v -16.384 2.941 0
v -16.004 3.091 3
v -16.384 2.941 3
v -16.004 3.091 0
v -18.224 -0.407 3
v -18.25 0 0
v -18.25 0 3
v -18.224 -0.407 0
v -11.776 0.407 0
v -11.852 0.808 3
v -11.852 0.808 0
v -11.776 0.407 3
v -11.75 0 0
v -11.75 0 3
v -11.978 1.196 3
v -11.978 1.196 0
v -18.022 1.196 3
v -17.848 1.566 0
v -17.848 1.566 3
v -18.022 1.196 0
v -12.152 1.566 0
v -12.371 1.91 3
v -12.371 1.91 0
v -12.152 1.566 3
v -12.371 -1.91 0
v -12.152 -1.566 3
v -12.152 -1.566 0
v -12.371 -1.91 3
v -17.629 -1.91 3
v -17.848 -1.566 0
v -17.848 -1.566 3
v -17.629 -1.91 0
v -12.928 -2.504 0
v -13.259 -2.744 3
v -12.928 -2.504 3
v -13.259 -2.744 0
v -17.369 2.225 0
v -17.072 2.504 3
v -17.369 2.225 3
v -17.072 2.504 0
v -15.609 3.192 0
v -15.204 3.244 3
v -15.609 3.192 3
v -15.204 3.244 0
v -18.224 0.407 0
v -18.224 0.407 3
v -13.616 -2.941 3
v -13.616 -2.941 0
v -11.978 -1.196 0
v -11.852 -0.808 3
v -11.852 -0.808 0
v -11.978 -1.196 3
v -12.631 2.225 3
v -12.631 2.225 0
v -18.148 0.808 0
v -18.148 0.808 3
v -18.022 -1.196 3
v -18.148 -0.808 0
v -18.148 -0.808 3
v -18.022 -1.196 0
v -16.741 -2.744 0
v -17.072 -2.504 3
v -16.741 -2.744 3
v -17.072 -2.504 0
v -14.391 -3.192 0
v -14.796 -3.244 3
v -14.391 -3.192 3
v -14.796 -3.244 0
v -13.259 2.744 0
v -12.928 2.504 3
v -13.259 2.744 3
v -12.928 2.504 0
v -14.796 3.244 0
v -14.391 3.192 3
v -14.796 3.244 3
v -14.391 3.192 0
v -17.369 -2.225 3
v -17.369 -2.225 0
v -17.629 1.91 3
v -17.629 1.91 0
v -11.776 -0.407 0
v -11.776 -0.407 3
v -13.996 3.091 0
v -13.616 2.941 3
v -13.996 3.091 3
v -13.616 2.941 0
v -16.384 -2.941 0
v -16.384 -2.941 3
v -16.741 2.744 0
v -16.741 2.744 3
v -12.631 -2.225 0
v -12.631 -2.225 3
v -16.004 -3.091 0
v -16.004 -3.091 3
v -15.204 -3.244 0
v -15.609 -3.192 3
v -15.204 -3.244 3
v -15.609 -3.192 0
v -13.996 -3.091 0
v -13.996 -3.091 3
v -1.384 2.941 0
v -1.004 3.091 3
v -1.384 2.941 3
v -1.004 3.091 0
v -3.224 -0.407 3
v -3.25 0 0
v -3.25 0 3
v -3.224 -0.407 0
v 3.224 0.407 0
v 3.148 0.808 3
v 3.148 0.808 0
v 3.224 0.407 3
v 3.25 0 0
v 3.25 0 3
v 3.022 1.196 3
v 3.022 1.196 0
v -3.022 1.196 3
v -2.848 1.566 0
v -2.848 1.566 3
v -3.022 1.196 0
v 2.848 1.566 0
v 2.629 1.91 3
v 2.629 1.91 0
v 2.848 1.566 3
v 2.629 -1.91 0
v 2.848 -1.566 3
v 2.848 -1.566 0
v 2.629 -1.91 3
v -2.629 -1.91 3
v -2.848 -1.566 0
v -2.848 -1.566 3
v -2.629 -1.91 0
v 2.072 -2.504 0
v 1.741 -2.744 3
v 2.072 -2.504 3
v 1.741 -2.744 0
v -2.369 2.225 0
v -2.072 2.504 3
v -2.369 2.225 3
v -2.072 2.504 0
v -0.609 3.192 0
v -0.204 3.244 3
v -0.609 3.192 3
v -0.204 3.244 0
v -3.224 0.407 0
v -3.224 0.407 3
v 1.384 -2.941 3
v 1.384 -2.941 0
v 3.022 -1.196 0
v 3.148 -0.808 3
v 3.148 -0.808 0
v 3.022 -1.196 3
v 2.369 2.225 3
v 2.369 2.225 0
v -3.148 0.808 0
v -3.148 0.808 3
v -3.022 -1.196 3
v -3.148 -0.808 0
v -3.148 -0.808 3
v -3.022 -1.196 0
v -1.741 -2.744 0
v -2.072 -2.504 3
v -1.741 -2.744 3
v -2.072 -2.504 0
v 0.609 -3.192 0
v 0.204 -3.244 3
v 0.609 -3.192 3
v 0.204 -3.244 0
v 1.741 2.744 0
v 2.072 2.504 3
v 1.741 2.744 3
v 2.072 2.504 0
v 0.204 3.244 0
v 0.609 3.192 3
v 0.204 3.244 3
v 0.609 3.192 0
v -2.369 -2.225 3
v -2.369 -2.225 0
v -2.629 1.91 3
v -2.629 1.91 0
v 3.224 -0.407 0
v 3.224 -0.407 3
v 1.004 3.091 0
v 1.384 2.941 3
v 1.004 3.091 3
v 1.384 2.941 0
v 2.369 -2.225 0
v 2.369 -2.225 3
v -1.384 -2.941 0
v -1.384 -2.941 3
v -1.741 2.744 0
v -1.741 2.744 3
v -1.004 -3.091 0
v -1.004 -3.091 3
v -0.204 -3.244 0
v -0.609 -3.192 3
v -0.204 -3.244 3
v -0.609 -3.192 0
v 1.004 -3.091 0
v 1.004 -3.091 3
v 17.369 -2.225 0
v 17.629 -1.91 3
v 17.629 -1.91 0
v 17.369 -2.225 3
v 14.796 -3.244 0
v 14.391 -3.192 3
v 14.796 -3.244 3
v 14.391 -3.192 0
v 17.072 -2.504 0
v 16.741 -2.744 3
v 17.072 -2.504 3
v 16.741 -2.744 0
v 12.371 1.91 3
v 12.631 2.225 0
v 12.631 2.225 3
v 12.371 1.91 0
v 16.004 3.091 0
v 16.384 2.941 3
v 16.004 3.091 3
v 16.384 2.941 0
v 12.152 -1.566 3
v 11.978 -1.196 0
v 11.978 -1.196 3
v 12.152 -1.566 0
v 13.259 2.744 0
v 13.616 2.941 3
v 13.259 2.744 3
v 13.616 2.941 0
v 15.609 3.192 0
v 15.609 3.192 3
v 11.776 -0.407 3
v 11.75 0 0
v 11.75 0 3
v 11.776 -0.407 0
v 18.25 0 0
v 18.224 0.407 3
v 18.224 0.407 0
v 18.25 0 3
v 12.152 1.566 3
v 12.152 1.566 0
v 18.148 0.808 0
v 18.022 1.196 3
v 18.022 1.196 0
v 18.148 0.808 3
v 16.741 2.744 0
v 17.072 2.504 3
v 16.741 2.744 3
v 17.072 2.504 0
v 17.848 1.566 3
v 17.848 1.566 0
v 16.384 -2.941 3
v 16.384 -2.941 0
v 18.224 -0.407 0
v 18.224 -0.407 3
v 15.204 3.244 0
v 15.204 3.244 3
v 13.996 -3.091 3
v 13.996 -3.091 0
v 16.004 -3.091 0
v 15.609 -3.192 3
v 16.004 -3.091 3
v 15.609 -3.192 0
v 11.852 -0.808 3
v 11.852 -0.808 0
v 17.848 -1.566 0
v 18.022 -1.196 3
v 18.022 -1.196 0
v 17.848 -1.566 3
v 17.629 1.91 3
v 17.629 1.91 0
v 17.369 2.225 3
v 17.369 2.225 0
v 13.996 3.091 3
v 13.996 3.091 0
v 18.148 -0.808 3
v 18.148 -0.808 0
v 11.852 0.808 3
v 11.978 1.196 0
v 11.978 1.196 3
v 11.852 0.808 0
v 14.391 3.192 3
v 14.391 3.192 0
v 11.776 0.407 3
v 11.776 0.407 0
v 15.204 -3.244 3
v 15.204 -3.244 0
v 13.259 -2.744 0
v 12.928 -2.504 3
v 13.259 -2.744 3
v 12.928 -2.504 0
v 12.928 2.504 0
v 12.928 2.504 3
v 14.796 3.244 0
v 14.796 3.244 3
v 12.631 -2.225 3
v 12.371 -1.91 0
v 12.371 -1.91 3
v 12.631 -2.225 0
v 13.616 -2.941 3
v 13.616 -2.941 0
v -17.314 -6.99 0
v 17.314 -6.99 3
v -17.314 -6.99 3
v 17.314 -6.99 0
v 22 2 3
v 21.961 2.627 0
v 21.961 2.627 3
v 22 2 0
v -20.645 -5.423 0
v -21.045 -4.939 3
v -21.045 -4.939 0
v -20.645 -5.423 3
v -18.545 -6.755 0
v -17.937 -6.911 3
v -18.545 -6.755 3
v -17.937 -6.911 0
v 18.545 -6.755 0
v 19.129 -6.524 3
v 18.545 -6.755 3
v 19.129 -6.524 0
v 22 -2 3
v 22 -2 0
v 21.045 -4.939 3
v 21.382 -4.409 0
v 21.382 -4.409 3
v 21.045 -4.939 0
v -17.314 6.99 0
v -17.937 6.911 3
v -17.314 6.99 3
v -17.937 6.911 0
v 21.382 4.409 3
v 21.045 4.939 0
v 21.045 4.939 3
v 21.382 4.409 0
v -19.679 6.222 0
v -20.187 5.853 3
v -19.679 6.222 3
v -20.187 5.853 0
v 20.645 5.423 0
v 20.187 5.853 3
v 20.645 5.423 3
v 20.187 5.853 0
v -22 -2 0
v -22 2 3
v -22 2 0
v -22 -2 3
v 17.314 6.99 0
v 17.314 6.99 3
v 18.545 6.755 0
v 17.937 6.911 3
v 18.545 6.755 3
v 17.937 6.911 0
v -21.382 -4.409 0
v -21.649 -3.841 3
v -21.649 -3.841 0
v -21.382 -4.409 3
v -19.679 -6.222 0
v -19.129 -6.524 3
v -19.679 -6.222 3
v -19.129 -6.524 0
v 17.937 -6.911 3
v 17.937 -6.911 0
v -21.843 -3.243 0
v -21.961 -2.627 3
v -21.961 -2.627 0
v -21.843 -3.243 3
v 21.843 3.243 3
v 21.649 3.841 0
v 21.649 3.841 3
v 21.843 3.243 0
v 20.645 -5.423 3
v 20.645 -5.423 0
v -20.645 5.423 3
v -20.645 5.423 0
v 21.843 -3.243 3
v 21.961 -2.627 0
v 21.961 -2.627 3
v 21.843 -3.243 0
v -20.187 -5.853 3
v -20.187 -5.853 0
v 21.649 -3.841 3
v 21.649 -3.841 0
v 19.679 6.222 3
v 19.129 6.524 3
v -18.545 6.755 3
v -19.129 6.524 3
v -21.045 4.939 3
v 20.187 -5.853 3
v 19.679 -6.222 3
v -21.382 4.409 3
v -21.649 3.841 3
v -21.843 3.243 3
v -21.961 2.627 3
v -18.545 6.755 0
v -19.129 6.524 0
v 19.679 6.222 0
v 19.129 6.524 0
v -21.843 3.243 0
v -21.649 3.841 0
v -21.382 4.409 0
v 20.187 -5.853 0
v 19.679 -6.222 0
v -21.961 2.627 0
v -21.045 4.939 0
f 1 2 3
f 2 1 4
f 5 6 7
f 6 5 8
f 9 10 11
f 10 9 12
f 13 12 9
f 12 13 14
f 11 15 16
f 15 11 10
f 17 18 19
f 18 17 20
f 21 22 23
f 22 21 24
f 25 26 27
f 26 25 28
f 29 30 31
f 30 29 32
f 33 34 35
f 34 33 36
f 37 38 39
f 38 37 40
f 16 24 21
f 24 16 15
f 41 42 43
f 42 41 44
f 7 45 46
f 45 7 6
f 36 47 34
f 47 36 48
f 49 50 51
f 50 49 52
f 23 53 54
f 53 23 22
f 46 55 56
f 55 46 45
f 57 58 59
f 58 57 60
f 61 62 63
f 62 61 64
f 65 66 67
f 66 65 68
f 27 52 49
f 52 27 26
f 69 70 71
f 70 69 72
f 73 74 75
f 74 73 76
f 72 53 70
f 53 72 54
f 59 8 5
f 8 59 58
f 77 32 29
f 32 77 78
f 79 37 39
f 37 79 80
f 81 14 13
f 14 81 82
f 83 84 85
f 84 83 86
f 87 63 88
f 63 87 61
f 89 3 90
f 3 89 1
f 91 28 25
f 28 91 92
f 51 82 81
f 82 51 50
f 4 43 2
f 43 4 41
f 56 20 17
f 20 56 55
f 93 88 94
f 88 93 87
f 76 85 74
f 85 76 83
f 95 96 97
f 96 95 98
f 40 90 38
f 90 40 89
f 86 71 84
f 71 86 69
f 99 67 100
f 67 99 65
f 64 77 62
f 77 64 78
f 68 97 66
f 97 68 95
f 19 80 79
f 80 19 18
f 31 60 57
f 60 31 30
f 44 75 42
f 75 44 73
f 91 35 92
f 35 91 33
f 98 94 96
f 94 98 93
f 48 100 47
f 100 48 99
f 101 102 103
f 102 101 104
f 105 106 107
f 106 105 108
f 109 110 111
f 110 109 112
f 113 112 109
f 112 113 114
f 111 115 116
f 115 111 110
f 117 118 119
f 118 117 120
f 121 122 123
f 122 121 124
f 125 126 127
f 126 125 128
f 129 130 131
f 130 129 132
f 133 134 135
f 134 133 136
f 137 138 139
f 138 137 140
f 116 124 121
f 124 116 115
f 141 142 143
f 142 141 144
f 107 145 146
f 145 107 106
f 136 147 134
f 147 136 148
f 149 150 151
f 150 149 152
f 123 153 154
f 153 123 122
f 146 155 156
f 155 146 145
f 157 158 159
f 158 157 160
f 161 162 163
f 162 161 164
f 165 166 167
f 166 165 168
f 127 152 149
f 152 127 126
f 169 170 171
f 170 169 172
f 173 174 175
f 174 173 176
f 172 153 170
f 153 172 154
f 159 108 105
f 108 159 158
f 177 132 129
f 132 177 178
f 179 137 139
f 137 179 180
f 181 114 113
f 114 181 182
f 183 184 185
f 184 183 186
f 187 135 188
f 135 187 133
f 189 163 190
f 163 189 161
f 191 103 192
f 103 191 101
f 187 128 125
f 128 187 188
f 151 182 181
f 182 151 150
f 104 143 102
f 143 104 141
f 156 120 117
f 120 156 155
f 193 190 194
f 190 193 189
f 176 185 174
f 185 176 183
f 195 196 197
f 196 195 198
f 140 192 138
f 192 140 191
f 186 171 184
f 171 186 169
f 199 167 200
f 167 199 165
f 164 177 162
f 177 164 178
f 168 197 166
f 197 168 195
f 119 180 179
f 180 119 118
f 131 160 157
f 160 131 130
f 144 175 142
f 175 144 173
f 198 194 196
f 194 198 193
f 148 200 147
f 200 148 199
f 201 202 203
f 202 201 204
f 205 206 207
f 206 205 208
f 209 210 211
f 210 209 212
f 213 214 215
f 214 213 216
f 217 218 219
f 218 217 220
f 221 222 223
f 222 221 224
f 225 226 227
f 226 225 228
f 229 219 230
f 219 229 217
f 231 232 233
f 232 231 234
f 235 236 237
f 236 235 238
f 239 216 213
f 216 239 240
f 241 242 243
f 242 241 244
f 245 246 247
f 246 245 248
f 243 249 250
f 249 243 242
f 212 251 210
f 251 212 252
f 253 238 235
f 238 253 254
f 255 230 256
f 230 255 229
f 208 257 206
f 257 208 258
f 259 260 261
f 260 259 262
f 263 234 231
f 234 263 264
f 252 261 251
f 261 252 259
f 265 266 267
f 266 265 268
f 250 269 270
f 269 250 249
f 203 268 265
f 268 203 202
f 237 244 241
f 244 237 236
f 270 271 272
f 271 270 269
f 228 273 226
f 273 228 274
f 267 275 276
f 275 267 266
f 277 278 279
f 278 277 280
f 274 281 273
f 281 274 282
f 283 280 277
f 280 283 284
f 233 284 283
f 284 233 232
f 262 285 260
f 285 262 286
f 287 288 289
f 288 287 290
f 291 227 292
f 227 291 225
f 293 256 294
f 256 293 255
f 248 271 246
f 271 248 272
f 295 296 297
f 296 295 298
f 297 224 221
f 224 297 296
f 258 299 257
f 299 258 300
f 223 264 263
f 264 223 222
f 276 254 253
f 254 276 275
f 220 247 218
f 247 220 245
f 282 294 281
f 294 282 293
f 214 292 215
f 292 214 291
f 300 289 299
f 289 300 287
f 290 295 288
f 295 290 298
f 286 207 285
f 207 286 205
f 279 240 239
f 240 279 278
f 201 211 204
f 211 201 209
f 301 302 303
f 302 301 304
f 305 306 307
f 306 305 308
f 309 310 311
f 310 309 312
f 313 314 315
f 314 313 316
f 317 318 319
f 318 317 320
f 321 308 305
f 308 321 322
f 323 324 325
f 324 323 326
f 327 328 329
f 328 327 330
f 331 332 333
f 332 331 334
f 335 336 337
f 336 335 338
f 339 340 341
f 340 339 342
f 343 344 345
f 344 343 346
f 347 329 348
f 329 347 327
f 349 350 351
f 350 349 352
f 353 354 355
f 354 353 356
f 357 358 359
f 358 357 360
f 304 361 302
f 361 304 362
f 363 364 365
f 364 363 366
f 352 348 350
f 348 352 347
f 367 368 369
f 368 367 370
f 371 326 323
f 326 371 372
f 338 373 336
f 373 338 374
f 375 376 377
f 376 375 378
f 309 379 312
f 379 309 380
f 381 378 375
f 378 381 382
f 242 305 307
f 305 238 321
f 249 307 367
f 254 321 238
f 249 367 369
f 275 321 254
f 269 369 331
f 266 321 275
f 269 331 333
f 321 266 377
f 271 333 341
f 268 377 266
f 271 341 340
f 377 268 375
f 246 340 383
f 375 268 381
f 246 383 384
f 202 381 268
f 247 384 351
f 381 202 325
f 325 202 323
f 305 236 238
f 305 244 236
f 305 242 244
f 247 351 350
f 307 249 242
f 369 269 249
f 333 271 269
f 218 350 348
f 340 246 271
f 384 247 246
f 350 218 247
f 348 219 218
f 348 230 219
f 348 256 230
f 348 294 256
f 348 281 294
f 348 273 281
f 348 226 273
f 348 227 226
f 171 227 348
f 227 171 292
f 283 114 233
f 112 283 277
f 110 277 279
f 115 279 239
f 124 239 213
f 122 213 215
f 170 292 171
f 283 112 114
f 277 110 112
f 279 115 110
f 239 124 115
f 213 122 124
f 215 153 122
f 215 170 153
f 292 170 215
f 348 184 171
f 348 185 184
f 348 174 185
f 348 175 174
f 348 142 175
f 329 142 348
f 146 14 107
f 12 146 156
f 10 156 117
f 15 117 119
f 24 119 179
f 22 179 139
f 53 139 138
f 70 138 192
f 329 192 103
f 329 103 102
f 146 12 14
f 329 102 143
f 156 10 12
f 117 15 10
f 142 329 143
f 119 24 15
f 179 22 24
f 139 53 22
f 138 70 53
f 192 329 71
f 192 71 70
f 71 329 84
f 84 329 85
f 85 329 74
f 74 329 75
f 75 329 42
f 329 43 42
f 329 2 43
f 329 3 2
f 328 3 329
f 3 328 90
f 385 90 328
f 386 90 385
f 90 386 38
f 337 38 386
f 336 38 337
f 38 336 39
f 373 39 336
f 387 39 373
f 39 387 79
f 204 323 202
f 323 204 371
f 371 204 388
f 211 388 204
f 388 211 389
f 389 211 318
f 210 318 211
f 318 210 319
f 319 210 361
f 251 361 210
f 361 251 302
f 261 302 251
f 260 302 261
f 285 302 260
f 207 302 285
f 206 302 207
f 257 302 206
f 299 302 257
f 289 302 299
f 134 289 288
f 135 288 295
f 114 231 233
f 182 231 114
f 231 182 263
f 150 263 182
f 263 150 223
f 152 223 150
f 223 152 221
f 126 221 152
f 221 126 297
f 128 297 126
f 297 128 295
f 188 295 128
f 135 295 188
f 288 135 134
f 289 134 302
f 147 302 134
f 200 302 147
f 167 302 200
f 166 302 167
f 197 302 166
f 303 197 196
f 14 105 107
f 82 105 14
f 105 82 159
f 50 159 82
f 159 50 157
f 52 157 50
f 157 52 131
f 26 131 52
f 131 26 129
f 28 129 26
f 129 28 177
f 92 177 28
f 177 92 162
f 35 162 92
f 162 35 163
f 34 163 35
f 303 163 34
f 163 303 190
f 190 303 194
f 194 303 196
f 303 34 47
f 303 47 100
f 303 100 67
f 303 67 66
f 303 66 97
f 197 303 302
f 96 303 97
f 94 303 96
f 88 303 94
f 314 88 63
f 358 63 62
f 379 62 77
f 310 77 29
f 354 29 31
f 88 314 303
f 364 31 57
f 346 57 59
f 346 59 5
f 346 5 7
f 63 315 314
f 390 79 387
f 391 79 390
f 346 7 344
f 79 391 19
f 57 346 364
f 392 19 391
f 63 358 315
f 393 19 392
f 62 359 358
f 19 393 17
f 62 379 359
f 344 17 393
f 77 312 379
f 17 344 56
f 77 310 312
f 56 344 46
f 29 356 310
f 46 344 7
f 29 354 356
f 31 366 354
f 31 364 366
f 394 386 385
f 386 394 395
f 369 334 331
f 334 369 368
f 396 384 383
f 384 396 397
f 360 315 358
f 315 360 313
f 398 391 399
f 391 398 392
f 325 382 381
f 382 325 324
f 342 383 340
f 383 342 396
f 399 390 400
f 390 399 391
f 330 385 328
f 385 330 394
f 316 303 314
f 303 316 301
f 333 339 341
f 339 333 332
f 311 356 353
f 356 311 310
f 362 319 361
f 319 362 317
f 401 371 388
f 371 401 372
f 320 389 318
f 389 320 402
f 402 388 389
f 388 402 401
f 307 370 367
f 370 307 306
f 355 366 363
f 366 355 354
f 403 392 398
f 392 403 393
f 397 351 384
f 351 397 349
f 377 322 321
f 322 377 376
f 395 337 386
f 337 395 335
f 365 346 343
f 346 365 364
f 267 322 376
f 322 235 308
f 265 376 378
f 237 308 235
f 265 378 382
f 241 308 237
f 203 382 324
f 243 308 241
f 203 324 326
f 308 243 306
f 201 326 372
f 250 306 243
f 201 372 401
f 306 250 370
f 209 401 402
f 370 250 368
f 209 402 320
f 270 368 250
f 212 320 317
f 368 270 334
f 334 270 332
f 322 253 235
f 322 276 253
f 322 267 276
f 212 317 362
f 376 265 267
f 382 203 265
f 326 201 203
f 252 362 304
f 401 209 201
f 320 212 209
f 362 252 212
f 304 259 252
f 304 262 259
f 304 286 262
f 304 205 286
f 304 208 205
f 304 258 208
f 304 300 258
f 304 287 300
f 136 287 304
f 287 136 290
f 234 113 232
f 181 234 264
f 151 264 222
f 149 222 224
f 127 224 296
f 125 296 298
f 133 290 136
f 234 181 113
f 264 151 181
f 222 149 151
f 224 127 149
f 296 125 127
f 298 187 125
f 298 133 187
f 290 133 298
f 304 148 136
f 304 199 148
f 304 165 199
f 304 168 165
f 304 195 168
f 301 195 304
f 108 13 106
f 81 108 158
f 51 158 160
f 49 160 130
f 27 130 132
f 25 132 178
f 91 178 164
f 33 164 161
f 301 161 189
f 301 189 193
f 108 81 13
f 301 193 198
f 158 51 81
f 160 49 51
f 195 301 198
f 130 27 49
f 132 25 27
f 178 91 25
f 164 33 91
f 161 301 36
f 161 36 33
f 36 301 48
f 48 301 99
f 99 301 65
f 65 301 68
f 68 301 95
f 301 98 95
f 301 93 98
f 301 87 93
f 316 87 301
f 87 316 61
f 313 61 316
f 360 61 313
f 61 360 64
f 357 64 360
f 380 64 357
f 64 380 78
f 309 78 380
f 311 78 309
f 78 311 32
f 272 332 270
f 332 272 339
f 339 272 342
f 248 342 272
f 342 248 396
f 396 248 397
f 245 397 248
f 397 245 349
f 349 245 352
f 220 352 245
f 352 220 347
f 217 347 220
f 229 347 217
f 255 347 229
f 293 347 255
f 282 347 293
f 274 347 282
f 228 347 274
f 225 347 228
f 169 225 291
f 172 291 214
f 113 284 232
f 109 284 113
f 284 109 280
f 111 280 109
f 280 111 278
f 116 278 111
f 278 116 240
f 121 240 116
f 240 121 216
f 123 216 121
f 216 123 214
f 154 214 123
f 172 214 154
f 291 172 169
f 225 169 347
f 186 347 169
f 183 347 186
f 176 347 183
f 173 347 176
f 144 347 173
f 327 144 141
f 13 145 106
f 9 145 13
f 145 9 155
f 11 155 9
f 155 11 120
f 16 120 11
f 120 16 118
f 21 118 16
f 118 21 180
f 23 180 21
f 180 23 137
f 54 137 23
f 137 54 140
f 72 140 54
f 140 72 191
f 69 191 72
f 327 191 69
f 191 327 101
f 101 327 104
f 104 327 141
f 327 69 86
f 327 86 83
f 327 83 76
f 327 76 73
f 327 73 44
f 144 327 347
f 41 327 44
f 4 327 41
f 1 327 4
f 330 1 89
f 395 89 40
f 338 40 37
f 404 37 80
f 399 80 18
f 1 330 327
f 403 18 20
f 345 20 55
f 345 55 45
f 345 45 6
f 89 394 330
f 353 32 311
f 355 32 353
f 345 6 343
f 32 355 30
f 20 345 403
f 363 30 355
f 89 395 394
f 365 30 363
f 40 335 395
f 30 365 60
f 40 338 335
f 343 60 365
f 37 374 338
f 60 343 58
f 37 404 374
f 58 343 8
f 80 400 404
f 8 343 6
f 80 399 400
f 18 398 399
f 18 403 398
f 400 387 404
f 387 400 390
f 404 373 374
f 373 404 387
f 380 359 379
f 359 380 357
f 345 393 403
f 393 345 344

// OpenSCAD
// Generated by SolidPython 1.1.3 on 2023-03-13 21:42:52
$fn = 50;


difference() {
	union() {
		translate(v = [0, 0, 0]) {
			rotate(a = [0, 0, 0]) {
				hull() {
					translate(v = [-17.0000000000, 2.0000000000, 0]) {
						rotate(a = [0, 0, 0]) {
							translate(v = [0, 0, 0]) {
								rotate(a = [0, 0, 0]) {
									cylinder(h = 3, r = 5);
								}
							}
						}
					}
					translate(v = [17.0000000000, 2.0000000000, 0]) {
						rotate(a = [0, 0, 0]) {
							translate(v = [0, 0, 0]) {
								rotate(a = [0, 0, 0]) {
									cylinder(h = 3, r = 5);
								}
							}
						}
					}
					translate(v = [-17.0000000000, -2.0000000000, 0]) {
						rotate(a = [0, 0, 0]) {
							translate(v = [0, 0, 0]) {
								rotate(a = [0, 0, 0]) {
									cylinder(h = 3, r = 5);
								}
							}
						}
					}
					translate(v = [17.0000000000, -2.0000000000, 0]) {
						rotate(a = [0, 0, 0]) {
							translate(v = [0, 0, 0]) {
								rotate(a = [0, 0, 0]) {
									cylinder(h = 3, r = 5);
								}
							}
						}
					}
				}
			}
		}
	}
	union() {
		translate(v = [-15.0000000000, 0.0000000000, 0]) {
			rotate(a = [0, 0, 0]) {
				translate(v = [0, 0, -50]) {
					rotate(a = [0, 0, 0]) {
						cylinder(h = 100, r = 3.2500000000);
					}
				}
			}
		}
		translate(v = [0.0000000000, 0.0000000000, 0]) {
			rotate(a = [0, 0, 0]) {
				translate(v = [0, 0, -50]) {
					rotate(a = [0, 0, 0]) {
						cylinder(h = 100, r = 3.2500000000);
					}
				}
			}
		}
		translate(v = [15.0000000000, 0.0000000000, 0]) {
			rotate(a = [0, 0, 0]) {
				translate(v = [0, 0, -50]) {
					rotate(a = [0, 0, 0]) {
						cylinder(h = 100, r = 3.2500000000);
					}
				}
			}
		}
	}
}
/***********************************************
*********      SolidPython code:      **********
************************************************
 
from solid import *
import os
import subprocess

import oomB

import opsc_library_gen

mode = "laser"
#mode = "3d_print"

defined_objects = {}

radius_dict = {}
countersunk_dict = {}


def set_mode(m):
    global mode
    mode = m
    radius_dict['M6'] = 6.5/2
    radius_dict['M3'] = 3.3/2
    if mode == "laser":
        radius_dict['M6'] = 6/2
        radius_dict['M3'] = 3/2

    countersunk_dict['M3'] = {}
    countersunk_dict['M3']['little_rad'] = radius_dict['M3']
    countersunk_dict['M3']['big_rad'] = (5.5+0.6)/2
    if mode == "laser":
        countersunk_dict['M3']['big_rad'] = (4.75+0.6)/2
        countersunk_dict['M3']['little_rad'] = (4.75+0.6)/2

    countersunk_dict['M3']['height'] = 1.7


def opsc_make_object(filename, objects, save_type="none",resolution=50, layers = 1, tilediff = 200, mode="laser", overwrite=True):
    if overwrite or not os.path.exists(filename):
        set_mode(mode)
        save_type = save_type.lower()
        os.makedirs(os.path.dirname(filename), exist_ok=True)
        final_object = opsc_get_object(objects, mode = mode)
        # Save the final object to the specified filename    
        scad_render_to_file(final_object, filename, file_header='$fn = %s;' % resolution, include_orig_code=True)
        if save_type == "all":
            saveToAll(filename)
        elif save_type == "dxf":
            saveToDxf(filename)
        if mode == "laser":
            filename_laser = filename.replace(".scad","-flat.scad")
            scad_render_to_file(getLaser(final_object, layers=layers, tilediff=tilediff), filename_laser, file_header='$fn = %s;' % resolution, include_orig_code=True)
            if save_type == "all":
                saveToAll(filename_laser)
            elif save_type == "dxf":
                saveToDxf(filename_laser)


def opsc_get_object(objects, mode = "laser"):
    # Create the solidpython objects only include the positive objects and if they don't have inclusion or their inclusion is either all or mode
    # Initialize an empty list to store the results
    positive_objects = []

    # Iterate over the "objects" list
    for obj in objects:
        # Check if the current object has a "type" key with a value of "positive"
        if obj['type'] == 'positive':
            # Check if the current object has an "inclusion" key and its value matches "mode",
            # or if the current object does not have an "inclusion" key at all
            if not 'inclusion' in obj or obj['inclusion'] == "all" or obj['inclusion'] == mode:
                # Call the "get_opsc_item" function with the current object as an argument
                opsc_item = get_opsc_item(obj)
                # Add the result to the "positive_objects" list
                positive_objects.append(opsc_item)
# Initialize an empty list to store the results
    negative_objects = []

    # Iterate over the "objects" list
    for obj in objects:
        # Check if the current object has a "type" key with a value of "negative"
        if obj['type'] == 'negative':
            # Check if the current object has an "inclusion" key and its value matches "mode",
            # or if the current object does not have an "inclusion" key at all
            if not 'inclusion' in obj or obj['inclusion'] == "all" or obj['inclusion'] == mode:
                # Call the "get_opsc_item" function with the current object as an argument
                opsc_item = get_opsc_item(obj)
                # Add the result to the "negative_objects" list
                negative_objects.append(opsc_item)
    
    #positive_objects = [get_opsc_item(obj) for obj in objects if obj['type'] == 'positive']
    #negative_objects = [get_opsc_item(obj) for obj in objects if obj['type'] == 'negative']
    # Union the positive objects
    positive_object = union()(*positive_objects)
    # Union the negative objects
    negative_object = union()(*negative_objects)
    # Create the final object by subtracting the negative objects from the positive objects
    return difference()(positive_object, negative_object)

def get_opsc_item(params):
    # A dictionary to map radius string values to numerical values
    #radius_dict = {'small': 5, 'medium': 10, 'large': 15}
    # An array of function names for basic shapes
    basic_shapes = ['cube', 'sphere', 'cylinder']
    
    # An array of function names for other shapes
    other_shapes = ['hole', 'slot', 'rounded_rectangle', 'countersunk', 'polyg']
    


    # Convert radius to r if present, and remove radius from the params dictionary
    if 'radius' in params:
        if isinstance(params['radius'], str):
            # Use the radius_dict to map the radius string value to a numerical value
            params['r'] = radius_dict[params['radius']]
        else:
            params['r'] = params['radius']
        del params['radius']
    

    # Check if the object type is a basic shape
    if params['shape'] in basic_shapes:
        # Remove shape and unexpected dictionary values
        allowed_keys = {'size', 'r', 'r1', 'r2', 'd', 'h', 'rw', 'rh', 'dw', 'dh'}
        shape_params = {k: v for k, v in params.items() if k in allowed_keys}

        #params['m'] = "#"
        ###split for adding modifier
        try:
            m = params['m']
            func = globals()[params['shape']]
            return_value = get_opsc_transform(params,func(**shape_params))
            return_value = (return_value).set_modifier(m)
            return return_value
        except KeyError as e:
            return get_opsc_transform(params,globals()[params['shape']](**shape_params))
        
    elif params['shape'] == 'polygon':
        # Remove shape and unexpected dictionary values
        h  = params['height']
        allowed_keys = {'points'}
        shape_params = {k: v for k, v in params.items() if k in allowed_keys}

        # Call the corresponding function for the shape parameter, using ** notation to pass the shape_params dictionary as keyword arguments
        params["rot"] = [0,0,0]        
        try:
            m = params['m']
            func = globals()[params['shape']]
            return_value = get_opsc_transform(params,linear_extrude(h)(globals()[params['shape']](**shape_params)))
            return_value = (return_value).set_modifier(m)
            return return_value
        except KeyError as e:
            return_value = get_opsc_transform(params,linear_extrude(h)(globals()[params['shape']](**shape_params)))
            return_value = (return_value)
            return return_value


    # If the object type is not a basic shape, check if it's a defined object or one of the other shapes
    elif params['shape'] in other_shapes:
        # Call the corresponding function for the shape parameter, passing the params dictionary as an argument
        p2 = copy.deepcopy(params)
        p2["pos"] = [0,0,0]
        return get_opsc_transform(params,globals()[params['shape']](p2))
    
    # If the object is not a basic shape or a defined object, try to import it from a .scad file
    else:
        obj = defined_objects[params['shape']]
        return get_opsc_transform(params,obj)

def get_opsc_transform(params, solid_obj):
    # Rotate the object based on the 'rot' field in the params dictionary, or the 'rotX', 'rotY', and 'rotZ' fields if 'rot' is not present
    rot = params.get('rot', [])
    if rot:
        rotX, rotY, rotZ = rot
    else:
        rotX = params.get('rotX', 0)
        rotY = params.get('rotY', 0)
        rotZ = params.get('rotZ', 0)
    solid_obj = rotate([rotX, rotY, rotZ])(solid_obj)

    # Translate the object based on the 'pos' field in the params dictionary, or the 'x', 'y', and 'z' fields if 'pos' is not present
    pos = params.get('pos', [])
    if pos:
        x, y, z = pos
    else:
        x = params.get('x', 0)
        y = params.get('y', 0)
        z = params.get('z', 0)
    solid_obj = translate([x, y, z])(solid_obj)
    return solid_obj


import random

def opsc_easy_array(type, shape, repeats, pos_start, shift_arr, **kwargs):
    for i in range(0,3):
        repeats.append(1)
        pos_start.append(0)
        shift_arr.append(0)
    return_objects = []

    for x in range(0,repeats[0]):
        for y in range(0,repeats[1]):
            for z in range(0,repeats[2]):
                return_objects.append(opsc_easy(type, shape, pos=[pos_start[0]+x*shift_arr[0],pos_start[1]+y*shift_arr[1],pos_start[2]+z*shift_arr[2]], **kwargs))
    return return_objects                



def opsc_easy(type, shape, **kwargs):
    obj = {
        'type': type,
        'shape': shape
    }
    for param in ['size', 'r', 'r1', 'r2', 'd', 'h', 'rw', 'rh', 'dw', 'dh', 'pos', 'x', 'y', 'z', 'rot', 'rotX', 'rotY', 'rotZ', "w", "inclusion", 'sides', 'height', "m"]:
        if param in kwargs:
            obj[param] = kwargs[param]
    return obj

def hole(params):
    p2 = copy.deepcopy(params)  
    # Check if the radius is a string and replace it with the corresponding value from the dictionary
    if isinstance(p2['r'], str):
        p2['r'] = radius_dict[p2['r']]
    
    # Set the height to 100 if not specified
    if 'h' not in p2:
        p2['h'] = 100
        p2["pos"] = [0,0,-50]
    p2["center"] = True
    # Create the cylinder object
    p2["shape"] = "cylinder"
    p2["type"] = "positive"

    return get_opsc_item(p2)

import copy

def countersunk(params):
    p2 = copy.deepcopy(params)
    counter_rad = p2['r']
    p2['r'] = radius_dict[p2['r']]
    hp = copy.deepcopy(p2)
    hp["type"] = "positive"
    hp["shape"] = "hole"
    del hp["rot"]
    hol = get_opsc_item(hp)
    
    cp = copy.deepcopy(p2)
    cp["h"] = countersunk_dict[counter_rad]["height"]
    cp["r2"] = countersunk_dict[counter_rad]["little_rad"]
    cp["r1"] = countersunk_dict[counter_rad]["big_rad"]
    del cp["r"]
    del cp["rot"]
    cp["type"] = "positive"
    cp["shape"] = "cylinder"
    cp["pos"] = [0,0,0]

    top = get_opsc_item(cp)
    return union()(hol,top)



def slot(params):  
    p2 = copy.deepcopy(params) 
    if isinstance(p2['r'], str):
        p2['r'] = radius_dict[p2['r']]
    p2["type"] = "positive"
    p2["shape"] = "hole"
    del p2["rot"]
    p2["pos"] = [0,0,0]
    left = copy.deepcopy(p2)
    right = copy.deepcopy(p2)
    left["pos"][0] = p2["w"] / 2 - p2["r"] 
    
    right["pos"][0] = -p2["w"] / 2 + p2["r"] 
    pass
    leftObj = get_opsc_item(left)
    rightObj = get_opsc_item(right)
    return hull()(leftObj, rightObj)

def rounded_rectangle(params):   
    p2 = copy.deepcopy(params) 
    p2["h"] = p2["size"][2]
    p2["pos"] = p2.get("pos", [0, 0, 0]) 
    p2["type"] = "positive"
    p2["shape"] = "hole"
    p2["pos"] = [0,0,0]
    
    if 'rot' in p2:
        del p2["rot"]   
    if 'r' not in p2:
        p2["r"] = 5 
    tl = copy.deepcopy(p2)
    tr = copy.deepcopy(p2)
    bl = copy.deepcopy(p2)
    br = copy.deepcopy(p2)
    tl["pos"][0] = -(p2["size"][0] - p2["r"]*2)/2
    tl["pos"][1] = (p2["size"][1] - p2["r"]*2)/2
    tr["pos"][0] = (p2["size"][0] - p2["r"]*2)/2
    tr["pos"][1] = (p2["size"][1] - p2["r"]*2)/2
    bl["pos"][0] = -(p2["size"][0] - p2["r"]*2)/2
    bl["pos"][1] = -(p2["size"][1] - p2["r"]*2)/2
    br["pos"][0] = (p2["size"][0] - p2["r"]*2)/2
    br["pos"][1] = -(p2["size"][1] - p2["r"]*2)/2
    del tl["size"]
    del tr["size"]
    del bl["size"]
    del br["size"]
    tlo = get_opsc_item(tl)
    tro = get_opsc_item(tr)
    blo = get_opsc_item(bl)
    bro = get_opsc_item(br)    
    return hull()(tlo, tro, blo, bro)



def polyg(params):
    p2 = copy.deepcopy(params) 
    p2["type"] = "positive"
    p2["shape"] = "polygon"
    p2["pos"] = [0,0,0]
    sides = p2["sides"]
    radius = p2["r"]    
    angles = [i * 360 / sides for i in range(sides)]
    points = regular_polygon(sides, radius)
    
    p2["points"] = points
    return get_opsc_item(p2)

import math

def regular_polygon(num_sides, radius):
    # Calculate the angle between each side
    angle = 2 * math.pi / num_sides

    # Calculate the points of the polygon
    points = []
    for i in range(num_sides):
        x = radius * math.cos(i * angle)
        y = radius * math.sin(i * angle)
        points.append((x, y))
    return points

def import_scad_object(filename):
    # Import the .scad file and convert it to a solidpython object
    #filename = "parts"
    obj = import_scad(filename)
    return obj.main()



import os
import solid as solidpython

# A dictionary to store the defined objects


def load_scad_objects():
    opsc_library_gen.gen_library(defined_objects)

import random

def test(num_objects):
    objects = []
    for i in range(num_objects):
        # Choose a random shape
        #shape = random.choice(['cube', 'sphere', 'cylinder', 'hole', 'slot', "rounded_rectangle"])
        shape = random.choice(["rounded_rectangle"])

        # Choose a random type
        type = random.choice(['positive', 'negative'])
        
        # Create an empty object dictionary
        obj = {'shape': shape, 'type': type}
        
        # Set shape-specific parameters
        if obj['shape'] in ['cube']:
            obj['size'] =  [random.uniform(5, 15), random.uniform(5, 15), random.uniform(5, 15)]
        if obj['shape'] in ['rounded_rectangle']:
            obj['size'] =  [random.uniform(5, 15), random.uniform(5, 15), random.uniform(5, 15)]
            obj['r'] = random.uniform(0.5, 5)
        elif obj['shape'] == 'sphere':
            obj['r'] = random.uniform(5, 15)
        elif obj['shape'] in ['cylinder', 'hole']:
            obj['r'] = random.uniform(0.5, 5)
            obj['h'] = random.uniform(5, 15)
        elif obj['shape'] == 'slot':
            obj['r'] = random.uniform(0.5, 5)
            obj['h'] = random.uniform(5, 15)
            obj['w'] = random.uniform(5, 15)
        
        # Set a random position and rotation
        obj['pos'] = [random.uniform(-20, 20), random.uniform(-20, 20), random.uniform(-20, 20)]
        obj['rot'] = [random.uniform(-180, 180), random.uniform(-180, 180), random.uniform(-180, 180)]
        
        # Add the object to the list
        objects.append(obj)
    return objects

####### old file saving
def saveToAll(fileIn):
    saveToStl(fileIn)
    saveToDxf(fileIn)
    saveToPng(fileIn)
    saveToSvg(fileIn)

def saveToDxf(fileIn, fileOut="", copy_to_laser=True):
    if fileOut == "":
        fileOut = fileIn.replace(".scad",".dxf")
    saveToFile(fileIn, fileOut)


    
def saveToPng(fileIn, fileOut="",extra="--render"):
    if fileOut == "":
        fileOut = fileIn.replace(".scad",".png")
    saveToFile(fileIn, fileOut)

def saveToStl(fileIn, fileOut=""):
    if fileOut == "":
        fileOut = fileIn.replace(".scad",".stl")
    saveToFile(fileIn, fileOut)
    
def saveToSvg(fileIn, fileOut=""):
    if fileOut == "":
        fileOut = fileIn.replace(".scad",".svg")
    saveToFile(fileIn, fileOut)

def saveToFile(fileIn, fileOut,extra=""):
    #extra = extra + " --colorscheme Tomorrow"

    launchStr = 'openscad -o "' + fileOut + '"' + extra + ' "' + fileIn + '"'
    if ".png" in fileOut:
        launchStr = launchStr + " --render"
    print("            saveToFile launch string: " + launchStr)
    subprocess.run(launchStr)
    x=0

def getLaser(final_object,start=1.5,layers=1,thickness=3,tilediff=200):
        rv= []

        for x in range(layers):
            rv.append(translate([0,x*tilediff,0])(
                    projection()(
                        intersection()(translate([-500,-500,start+x*thickness])(cube(size=[1000,1000,0.1])),
                            final_object
                        )
                    )
            )
            )
            
        return union()(rv)

set_mode("laser")
load_scad_objects() 
 
************************************************/
